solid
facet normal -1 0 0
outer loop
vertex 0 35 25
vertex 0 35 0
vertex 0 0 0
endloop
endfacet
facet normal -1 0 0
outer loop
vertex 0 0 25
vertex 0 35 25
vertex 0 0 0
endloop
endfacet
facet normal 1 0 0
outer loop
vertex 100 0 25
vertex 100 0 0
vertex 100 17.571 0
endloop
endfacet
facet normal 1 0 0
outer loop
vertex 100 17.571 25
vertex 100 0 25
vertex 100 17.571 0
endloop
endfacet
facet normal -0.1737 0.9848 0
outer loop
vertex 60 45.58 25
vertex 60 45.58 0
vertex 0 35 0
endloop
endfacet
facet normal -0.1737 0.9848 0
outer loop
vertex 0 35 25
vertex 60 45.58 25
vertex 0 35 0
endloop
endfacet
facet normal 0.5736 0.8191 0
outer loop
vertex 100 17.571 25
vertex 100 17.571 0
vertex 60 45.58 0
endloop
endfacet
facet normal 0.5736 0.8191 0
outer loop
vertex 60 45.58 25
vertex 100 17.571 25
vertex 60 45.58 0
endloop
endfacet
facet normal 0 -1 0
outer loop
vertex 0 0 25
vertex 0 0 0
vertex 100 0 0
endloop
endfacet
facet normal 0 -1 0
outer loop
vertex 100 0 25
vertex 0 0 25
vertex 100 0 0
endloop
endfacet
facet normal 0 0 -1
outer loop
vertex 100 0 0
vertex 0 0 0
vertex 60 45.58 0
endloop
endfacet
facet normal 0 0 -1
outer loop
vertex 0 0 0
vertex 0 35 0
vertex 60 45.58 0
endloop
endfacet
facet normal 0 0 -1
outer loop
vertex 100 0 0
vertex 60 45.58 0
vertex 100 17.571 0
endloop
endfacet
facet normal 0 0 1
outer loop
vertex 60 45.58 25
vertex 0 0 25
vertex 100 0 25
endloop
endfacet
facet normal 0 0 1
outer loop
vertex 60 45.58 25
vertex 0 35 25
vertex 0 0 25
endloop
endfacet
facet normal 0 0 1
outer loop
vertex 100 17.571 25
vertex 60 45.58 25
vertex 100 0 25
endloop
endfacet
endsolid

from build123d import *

# Parameters (mm, degrees)
BOSS_EXTRUDE1_DEPTH = 25


with BuildPart() as part:
    # Sketch1 → Boss-Extrude1 (new body)
    with BuildSketch(Plane.XY):
        Polygon((0, 0), (100, 0), (100, 17.571317314), (60, 45.579618843), (0, 35), align=None)
    extrude(amount=BOSS_EXTRUDE1_DEPTH)


solid = part.part
